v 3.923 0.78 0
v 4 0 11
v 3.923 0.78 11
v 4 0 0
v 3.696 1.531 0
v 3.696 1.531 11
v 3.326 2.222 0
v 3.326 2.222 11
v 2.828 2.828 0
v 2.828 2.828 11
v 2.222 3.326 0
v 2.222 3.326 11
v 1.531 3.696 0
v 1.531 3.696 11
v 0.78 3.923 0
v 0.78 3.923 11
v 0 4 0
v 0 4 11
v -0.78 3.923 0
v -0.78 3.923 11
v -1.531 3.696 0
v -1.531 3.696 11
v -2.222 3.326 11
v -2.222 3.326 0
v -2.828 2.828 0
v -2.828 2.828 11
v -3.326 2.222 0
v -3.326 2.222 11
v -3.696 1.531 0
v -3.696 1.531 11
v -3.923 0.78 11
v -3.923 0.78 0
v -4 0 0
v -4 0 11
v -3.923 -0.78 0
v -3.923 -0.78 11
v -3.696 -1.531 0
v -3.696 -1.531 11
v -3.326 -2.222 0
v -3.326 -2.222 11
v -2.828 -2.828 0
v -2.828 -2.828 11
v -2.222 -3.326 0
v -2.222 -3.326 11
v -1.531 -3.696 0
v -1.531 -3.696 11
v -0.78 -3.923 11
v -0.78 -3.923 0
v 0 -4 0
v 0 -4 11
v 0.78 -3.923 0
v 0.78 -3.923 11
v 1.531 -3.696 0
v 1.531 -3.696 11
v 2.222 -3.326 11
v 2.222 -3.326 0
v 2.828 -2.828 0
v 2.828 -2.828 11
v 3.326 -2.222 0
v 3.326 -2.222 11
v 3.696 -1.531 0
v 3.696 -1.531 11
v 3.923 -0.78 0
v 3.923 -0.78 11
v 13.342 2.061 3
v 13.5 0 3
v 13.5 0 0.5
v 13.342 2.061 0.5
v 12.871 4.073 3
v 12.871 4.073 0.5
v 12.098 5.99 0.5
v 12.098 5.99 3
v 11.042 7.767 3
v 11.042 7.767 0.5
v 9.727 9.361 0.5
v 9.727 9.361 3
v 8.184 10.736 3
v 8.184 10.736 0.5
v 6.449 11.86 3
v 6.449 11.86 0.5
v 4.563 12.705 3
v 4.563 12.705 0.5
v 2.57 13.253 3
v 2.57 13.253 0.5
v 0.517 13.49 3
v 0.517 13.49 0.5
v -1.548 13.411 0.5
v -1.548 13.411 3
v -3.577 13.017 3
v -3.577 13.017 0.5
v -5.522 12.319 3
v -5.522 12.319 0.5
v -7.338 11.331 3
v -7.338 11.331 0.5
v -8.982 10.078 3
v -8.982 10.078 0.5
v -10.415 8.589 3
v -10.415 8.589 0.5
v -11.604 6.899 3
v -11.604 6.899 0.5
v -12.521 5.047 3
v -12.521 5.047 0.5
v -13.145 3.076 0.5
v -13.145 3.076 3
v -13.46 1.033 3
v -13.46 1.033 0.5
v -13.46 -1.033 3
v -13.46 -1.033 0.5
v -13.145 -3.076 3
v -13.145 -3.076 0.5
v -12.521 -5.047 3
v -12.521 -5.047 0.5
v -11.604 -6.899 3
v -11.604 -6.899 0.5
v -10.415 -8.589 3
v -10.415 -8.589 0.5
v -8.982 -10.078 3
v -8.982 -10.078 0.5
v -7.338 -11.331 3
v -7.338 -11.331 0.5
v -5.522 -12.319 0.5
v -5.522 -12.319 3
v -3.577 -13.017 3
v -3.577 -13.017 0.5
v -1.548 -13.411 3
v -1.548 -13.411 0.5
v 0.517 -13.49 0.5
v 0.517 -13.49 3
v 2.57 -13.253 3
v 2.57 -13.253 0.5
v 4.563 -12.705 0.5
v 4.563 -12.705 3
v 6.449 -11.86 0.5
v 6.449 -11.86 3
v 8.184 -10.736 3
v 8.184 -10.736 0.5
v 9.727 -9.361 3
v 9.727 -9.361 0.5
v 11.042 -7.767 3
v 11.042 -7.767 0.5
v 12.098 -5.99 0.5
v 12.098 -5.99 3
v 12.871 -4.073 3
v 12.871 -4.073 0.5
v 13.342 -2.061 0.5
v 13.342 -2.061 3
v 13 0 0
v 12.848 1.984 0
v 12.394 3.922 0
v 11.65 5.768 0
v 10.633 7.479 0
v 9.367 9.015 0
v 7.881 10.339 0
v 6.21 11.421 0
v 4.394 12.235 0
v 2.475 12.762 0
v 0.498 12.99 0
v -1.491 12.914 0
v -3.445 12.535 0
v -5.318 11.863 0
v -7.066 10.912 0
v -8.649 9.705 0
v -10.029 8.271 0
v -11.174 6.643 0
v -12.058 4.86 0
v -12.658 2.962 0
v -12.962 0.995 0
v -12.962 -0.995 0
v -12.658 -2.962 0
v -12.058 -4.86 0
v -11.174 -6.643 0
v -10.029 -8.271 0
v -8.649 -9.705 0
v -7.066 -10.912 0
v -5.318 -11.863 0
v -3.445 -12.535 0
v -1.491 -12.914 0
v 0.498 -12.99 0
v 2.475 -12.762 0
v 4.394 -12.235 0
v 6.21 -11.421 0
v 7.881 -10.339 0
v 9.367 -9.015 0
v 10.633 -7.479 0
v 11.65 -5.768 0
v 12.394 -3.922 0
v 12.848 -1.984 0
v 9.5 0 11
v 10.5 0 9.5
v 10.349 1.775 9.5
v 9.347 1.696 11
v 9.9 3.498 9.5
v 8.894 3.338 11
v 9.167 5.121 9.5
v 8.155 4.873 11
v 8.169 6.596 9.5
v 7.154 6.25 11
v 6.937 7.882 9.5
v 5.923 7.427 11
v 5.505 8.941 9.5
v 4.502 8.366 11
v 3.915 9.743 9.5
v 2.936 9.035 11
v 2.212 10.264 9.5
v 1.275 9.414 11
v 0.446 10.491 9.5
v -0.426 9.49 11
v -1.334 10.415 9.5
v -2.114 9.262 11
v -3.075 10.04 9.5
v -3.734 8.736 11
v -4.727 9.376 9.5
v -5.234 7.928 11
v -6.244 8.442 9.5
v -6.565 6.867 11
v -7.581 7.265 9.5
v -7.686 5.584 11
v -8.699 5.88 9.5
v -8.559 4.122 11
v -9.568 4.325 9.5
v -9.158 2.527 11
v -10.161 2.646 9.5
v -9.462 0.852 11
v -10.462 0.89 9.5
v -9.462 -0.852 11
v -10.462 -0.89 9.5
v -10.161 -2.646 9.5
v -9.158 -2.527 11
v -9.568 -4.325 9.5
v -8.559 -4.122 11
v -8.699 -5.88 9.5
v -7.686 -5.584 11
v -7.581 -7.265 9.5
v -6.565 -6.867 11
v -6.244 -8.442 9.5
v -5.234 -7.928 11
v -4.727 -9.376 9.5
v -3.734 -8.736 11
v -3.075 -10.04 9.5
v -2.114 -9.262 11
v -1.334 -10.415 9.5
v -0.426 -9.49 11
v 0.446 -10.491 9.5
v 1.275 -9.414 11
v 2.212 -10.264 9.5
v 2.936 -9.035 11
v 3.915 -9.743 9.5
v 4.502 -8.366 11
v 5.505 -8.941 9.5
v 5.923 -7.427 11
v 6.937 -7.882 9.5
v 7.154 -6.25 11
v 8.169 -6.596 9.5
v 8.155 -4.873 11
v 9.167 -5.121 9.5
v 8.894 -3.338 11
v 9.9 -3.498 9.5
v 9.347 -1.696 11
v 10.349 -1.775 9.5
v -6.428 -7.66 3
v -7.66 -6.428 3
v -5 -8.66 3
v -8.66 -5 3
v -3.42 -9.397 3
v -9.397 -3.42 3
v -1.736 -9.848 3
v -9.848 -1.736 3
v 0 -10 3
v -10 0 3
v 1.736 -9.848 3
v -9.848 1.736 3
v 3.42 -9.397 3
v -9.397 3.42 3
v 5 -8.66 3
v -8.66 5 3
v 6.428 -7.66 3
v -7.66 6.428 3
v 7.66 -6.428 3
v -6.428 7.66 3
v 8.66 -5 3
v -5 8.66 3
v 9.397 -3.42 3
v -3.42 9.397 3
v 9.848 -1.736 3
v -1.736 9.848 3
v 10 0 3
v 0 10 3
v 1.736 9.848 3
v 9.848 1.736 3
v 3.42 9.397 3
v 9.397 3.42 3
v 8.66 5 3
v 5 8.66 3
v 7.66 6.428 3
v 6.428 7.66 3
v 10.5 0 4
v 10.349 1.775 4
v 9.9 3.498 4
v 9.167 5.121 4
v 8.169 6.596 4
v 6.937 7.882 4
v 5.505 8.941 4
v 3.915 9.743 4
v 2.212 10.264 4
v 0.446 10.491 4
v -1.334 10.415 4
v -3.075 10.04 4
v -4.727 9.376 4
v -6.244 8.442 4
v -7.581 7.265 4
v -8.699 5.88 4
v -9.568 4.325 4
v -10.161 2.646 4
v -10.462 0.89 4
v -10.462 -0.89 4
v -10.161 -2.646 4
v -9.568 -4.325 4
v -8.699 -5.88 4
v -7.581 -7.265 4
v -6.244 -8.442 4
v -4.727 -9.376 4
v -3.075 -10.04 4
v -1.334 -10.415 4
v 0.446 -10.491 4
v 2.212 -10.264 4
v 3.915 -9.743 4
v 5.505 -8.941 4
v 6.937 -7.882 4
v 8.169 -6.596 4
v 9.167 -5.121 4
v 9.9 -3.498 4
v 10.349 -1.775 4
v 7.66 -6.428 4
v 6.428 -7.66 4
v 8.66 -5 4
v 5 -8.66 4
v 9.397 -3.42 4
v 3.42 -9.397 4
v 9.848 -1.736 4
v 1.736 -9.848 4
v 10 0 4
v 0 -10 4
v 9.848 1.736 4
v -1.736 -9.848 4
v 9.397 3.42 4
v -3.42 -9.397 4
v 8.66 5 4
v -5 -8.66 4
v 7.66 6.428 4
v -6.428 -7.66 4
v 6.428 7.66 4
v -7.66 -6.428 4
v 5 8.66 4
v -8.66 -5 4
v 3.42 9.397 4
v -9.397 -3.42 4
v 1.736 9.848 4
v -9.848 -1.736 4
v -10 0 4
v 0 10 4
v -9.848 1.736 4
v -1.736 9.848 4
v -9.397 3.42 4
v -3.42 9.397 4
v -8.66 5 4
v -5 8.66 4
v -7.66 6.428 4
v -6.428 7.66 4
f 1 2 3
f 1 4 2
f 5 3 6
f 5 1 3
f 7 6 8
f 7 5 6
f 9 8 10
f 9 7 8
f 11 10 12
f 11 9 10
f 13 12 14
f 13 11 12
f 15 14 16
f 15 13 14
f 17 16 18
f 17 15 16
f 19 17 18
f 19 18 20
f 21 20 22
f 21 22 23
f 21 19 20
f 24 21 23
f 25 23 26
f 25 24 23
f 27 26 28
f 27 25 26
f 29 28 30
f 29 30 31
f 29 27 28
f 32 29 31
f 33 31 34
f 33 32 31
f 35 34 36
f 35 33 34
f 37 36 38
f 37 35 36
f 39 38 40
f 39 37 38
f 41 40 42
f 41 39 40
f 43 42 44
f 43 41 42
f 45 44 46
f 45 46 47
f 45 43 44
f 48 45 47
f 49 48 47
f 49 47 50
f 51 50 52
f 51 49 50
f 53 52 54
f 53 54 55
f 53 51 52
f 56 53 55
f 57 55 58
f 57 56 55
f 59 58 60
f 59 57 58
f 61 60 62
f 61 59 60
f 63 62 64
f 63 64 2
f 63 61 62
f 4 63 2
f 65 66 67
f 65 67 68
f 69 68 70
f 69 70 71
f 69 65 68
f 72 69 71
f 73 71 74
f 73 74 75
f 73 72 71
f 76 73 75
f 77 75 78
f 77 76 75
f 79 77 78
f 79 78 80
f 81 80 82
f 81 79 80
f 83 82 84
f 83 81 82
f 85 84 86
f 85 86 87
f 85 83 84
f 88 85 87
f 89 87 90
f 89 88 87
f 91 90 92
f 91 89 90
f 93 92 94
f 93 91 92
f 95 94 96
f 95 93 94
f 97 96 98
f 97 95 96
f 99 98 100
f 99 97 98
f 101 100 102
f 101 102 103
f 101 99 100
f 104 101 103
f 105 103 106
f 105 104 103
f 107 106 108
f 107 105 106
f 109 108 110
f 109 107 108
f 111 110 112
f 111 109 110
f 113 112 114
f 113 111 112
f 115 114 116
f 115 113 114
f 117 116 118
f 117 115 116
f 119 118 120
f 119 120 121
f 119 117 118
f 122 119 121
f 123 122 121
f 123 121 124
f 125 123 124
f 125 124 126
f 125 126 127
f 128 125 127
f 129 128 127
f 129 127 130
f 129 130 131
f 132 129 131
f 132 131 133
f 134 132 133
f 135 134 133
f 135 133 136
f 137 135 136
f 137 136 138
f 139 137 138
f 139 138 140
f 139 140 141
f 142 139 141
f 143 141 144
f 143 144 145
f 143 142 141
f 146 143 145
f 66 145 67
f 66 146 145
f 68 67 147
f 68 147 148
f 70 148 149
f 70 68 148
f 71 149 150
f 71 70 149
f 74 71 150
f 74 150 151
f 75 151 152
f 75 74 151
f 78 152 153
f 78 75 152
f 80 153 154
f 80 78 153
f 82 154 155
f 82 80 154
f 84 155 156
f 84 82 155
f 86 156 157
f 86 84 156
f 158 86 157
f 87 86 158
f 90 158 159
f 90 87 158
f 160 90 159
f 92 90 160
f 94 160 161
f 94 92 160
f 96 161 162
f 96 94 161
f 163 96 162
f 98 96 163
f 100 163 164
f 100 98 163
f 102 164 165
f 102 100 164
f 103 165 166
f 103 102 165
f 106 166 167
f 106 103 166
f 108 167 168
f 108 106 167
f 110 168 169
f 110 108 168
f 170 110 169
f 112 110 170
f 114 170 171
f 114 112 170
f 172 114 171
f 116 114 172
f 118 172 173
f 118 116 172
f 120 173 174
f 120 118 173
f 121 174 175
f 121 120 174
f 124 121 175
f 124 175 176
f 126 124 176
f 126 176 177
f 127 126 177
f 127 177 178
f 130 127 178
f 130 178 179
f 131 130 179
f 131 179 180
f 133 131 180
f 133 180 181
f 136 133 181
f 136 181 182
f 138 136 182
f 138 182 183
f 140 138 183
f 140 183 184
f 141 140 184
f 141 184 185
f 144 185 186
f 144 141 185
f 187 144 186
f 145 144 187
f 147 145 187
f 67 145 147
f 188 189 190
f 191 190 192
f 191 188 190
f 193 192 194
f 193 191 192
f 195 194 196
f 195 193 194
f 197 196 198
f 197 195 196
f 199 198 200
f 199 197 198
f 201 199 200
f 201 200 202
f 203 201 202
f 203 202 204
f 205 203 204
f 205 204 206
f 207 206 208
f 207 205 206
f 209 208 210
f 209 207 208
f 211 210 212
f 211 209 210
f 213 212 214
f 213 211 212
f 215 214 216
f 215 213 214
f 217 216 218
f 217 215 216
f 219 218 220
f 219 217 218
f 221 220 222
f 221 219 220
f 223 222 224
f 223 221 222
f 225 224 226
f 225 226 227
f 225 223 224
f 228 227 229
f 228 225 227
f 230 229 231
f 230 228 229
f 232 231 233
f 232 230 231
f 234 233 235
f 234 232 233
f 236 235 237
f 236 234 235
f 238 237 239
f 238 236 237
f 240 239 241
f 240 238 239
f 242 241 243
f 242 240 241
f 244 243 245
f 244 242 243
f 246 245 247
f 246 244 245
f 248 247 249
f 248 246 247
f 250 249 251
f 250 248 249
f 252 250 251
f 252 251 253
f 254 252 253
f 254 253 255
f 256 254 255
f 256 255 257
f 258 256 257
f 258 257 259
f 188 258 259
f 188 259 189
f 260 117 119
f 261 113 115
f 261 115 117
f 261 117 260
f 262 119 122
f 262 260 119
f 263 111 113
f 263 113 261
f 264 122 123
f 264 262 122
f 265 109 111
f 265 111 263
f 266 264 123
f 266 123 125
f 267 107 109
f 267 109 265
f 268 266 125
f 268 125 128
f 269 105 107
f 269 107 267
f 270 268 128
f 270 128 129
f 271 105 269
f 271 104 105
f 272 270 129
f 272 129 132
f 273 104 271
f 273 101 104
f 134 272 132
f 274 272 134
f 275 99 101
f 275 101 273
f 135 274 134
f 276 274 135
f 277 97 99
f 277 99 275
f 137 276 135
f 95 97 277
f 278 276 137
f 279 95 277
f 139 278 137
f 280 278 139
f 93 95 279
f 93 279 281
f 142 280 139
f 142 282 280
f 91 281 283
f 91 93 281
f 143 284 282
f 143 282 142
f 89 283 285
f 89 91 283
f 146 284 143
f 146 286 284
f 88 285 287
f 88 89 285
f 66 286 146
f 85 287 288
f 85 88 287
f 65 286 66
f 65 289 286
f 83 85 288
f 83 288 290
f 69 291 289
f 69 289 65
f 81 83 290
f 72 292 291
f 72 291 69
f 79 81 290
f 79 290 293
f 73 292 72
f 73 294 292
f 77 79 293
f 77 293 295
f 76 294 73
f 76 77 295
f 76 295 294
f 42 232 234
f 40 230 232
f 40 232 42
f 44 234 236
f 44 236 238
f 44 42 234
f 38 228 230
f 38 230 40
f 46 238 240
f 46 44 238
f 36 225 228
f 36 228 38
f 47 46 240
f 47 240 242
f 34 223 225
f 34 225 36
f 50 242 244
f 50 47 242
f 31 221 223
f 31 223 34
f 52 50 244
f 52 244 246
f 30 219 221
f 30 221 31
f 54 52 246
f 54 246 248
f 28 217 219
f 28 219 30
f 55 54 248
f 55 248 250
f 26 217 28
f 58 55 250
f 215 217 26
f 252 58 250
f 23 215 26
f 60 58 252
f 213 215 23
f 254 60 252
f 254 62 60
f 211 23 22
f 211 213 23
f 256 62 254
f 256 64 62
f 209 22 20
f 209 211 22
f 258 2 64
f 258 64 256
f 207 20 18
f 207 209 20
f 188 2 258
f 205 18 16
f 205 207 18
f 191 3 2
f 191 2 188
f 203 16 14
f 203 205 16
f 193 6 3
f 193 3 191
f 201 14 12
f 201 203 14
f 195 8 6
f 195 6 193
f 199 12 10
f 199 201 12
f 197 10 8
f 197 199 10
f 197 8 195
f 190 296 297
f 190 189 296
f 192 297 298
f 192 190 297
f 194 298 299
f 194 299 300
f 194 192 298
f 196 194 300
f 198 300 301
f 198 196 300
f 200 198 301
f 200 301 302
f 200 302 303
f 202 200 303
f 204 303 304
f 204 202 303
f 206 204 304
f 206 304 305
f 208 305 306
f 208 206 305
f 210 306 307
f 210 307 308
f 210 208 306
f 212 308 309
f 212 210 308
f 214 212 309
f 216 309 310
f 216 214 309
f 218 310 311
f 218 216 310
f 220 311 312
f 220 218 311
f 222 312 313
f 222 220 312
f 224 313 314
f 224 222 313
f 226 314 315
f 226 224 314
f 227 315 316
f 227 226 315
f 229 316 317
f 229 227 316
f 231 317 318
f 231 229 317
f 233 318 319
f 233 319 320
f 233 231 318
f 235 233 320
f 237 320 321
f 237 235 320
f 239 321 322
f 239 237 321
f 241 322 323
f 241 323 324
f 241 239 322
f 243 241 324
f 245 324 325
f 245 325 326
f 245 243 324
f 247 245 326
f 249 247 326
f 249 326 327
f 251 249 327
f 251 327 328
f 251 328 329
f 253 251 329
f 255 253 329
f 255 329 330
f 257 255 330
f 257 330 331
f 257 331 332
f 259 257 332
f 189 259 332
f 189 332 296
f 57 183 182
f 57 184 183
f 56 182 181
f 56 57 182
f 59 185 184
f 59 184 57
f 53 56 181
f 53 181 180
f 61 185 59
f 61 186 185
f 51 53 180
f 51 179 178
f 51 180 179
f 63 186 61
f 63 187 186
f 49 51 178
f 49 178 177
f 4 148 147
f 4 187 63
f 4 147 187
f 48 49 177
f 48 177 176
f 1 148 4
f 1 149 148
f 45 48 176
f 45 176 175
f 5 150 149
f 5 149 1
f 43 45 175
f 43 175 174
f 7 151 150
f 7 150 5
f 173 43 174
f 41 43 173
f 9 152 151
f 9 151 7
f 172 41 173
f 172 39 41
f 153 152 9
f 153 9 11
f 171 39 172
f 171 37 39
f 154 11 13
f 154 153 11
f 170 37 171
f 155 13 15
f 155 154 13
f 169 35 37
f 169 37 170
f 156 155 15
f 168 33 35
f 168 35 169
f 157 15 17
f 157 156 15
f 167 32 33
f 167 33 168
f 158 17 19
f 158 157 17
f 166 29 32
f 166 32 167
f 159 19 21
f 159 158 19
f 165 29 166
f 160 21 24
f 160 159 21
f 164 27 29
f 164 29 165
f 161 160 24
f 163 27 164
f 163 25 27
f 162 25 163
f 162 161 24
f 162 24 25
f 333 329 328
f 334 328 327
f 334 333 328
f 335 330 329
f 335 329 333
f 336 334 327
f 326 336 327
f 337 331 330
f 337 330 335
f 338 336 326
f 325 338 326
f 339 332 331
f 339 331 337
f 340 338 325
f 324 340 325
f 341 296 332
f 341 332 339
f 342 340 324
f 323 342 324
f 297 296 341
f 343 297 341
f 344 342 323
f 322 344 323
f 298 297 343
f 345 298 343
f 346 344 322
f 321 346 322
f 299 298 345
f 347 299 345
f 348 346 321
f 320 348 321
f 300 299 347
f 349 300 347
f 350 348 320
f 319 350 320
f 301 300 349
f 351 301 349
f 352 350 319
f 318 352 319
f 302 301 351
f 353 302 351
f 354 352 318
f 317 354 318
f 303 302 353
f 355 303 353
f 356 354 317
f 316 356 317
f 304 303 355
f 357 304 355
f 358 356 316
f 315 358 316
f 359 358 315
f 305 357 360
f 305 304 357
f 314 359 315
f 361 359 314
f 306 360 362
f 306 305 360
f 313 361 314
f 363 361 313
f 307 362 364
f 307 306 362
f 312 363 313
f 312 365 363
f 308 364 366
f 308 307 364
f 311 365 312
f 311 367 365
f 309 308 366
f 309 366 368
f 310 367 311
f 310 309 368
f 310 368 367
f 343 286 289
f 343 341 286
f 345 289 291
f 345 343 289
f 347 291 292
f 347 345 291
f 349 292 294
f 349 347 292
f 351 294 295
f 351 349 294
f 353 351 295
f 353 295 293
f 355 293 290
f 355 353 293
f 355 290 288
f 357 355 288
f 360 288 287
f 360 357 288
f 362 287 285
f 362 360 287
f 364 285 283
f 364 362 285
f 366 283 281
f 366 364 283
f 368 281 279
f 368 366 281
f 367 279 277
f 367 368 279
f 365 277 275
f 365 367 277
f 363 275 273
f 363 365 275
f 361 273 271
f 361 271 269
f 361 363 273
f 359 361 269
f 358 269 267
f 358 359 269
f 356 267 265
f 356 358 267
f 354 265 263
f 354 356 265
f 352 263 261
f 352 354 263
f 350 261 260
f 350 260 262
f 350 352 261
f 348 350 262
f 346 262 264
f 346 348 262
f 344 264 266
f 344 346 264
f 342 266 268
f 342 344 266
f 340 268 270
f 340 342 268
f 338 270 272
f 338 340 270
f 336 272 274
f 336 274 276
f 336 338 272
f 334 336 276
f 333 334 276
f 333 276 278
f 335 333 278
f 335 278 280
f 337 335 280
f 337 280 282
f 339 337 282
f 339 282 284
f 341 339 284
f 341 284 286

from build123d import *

# Parameters (mm, degrees)
F2_SIZE2 = 1
F2_SIZE  = 1.5
F3_SIZE  = 0.5
F4_W     = 0.5
F4_H     = 1


with BuildPart() as f1:
    # F0 (on Front) → F1 (revolve)
    with BuildSketch(Plane.XZ):
        Polygon((10.5, 11), (4, 11), (4, 0), (13.5, 0), (13.5, 3), (10.5, 3), align=None)
    revolve(axis=Axis((0, 0, 2.786824197), (0, 0, 1)))

    # F2
    f2_edges = [f1.edges().sort_by_distance(p)[0] for p in [
        (-10.5, 0, 11),
    ]]
    f2_side = f1.faces().sort_by_distance((-10.5, 0, 7))[0]
    chamfer(f2_edges, length=F2_SIZE, length2=F2_SIZE2, reference=f2_side)

    # F3
    f3_edges = [f1.edges().sort_by_distance(p)[0] for p in [
        (-13.5, 0, 0),
    ]]
    chamfer(f3_edges, length=F3_SIZE)

    # F4 (on Front) → F5 (revolve, cut)
    with BuildSketch(Plane.XZ):
        with Locations((10.25, 3.5)):
            Rectangle(F4_W, F4_H)
    revolve(axis=Axis((0, 0, 2.786824197), (0, 0, 1)), mode=Mode.SUBTRACT)


solid = f1.part
